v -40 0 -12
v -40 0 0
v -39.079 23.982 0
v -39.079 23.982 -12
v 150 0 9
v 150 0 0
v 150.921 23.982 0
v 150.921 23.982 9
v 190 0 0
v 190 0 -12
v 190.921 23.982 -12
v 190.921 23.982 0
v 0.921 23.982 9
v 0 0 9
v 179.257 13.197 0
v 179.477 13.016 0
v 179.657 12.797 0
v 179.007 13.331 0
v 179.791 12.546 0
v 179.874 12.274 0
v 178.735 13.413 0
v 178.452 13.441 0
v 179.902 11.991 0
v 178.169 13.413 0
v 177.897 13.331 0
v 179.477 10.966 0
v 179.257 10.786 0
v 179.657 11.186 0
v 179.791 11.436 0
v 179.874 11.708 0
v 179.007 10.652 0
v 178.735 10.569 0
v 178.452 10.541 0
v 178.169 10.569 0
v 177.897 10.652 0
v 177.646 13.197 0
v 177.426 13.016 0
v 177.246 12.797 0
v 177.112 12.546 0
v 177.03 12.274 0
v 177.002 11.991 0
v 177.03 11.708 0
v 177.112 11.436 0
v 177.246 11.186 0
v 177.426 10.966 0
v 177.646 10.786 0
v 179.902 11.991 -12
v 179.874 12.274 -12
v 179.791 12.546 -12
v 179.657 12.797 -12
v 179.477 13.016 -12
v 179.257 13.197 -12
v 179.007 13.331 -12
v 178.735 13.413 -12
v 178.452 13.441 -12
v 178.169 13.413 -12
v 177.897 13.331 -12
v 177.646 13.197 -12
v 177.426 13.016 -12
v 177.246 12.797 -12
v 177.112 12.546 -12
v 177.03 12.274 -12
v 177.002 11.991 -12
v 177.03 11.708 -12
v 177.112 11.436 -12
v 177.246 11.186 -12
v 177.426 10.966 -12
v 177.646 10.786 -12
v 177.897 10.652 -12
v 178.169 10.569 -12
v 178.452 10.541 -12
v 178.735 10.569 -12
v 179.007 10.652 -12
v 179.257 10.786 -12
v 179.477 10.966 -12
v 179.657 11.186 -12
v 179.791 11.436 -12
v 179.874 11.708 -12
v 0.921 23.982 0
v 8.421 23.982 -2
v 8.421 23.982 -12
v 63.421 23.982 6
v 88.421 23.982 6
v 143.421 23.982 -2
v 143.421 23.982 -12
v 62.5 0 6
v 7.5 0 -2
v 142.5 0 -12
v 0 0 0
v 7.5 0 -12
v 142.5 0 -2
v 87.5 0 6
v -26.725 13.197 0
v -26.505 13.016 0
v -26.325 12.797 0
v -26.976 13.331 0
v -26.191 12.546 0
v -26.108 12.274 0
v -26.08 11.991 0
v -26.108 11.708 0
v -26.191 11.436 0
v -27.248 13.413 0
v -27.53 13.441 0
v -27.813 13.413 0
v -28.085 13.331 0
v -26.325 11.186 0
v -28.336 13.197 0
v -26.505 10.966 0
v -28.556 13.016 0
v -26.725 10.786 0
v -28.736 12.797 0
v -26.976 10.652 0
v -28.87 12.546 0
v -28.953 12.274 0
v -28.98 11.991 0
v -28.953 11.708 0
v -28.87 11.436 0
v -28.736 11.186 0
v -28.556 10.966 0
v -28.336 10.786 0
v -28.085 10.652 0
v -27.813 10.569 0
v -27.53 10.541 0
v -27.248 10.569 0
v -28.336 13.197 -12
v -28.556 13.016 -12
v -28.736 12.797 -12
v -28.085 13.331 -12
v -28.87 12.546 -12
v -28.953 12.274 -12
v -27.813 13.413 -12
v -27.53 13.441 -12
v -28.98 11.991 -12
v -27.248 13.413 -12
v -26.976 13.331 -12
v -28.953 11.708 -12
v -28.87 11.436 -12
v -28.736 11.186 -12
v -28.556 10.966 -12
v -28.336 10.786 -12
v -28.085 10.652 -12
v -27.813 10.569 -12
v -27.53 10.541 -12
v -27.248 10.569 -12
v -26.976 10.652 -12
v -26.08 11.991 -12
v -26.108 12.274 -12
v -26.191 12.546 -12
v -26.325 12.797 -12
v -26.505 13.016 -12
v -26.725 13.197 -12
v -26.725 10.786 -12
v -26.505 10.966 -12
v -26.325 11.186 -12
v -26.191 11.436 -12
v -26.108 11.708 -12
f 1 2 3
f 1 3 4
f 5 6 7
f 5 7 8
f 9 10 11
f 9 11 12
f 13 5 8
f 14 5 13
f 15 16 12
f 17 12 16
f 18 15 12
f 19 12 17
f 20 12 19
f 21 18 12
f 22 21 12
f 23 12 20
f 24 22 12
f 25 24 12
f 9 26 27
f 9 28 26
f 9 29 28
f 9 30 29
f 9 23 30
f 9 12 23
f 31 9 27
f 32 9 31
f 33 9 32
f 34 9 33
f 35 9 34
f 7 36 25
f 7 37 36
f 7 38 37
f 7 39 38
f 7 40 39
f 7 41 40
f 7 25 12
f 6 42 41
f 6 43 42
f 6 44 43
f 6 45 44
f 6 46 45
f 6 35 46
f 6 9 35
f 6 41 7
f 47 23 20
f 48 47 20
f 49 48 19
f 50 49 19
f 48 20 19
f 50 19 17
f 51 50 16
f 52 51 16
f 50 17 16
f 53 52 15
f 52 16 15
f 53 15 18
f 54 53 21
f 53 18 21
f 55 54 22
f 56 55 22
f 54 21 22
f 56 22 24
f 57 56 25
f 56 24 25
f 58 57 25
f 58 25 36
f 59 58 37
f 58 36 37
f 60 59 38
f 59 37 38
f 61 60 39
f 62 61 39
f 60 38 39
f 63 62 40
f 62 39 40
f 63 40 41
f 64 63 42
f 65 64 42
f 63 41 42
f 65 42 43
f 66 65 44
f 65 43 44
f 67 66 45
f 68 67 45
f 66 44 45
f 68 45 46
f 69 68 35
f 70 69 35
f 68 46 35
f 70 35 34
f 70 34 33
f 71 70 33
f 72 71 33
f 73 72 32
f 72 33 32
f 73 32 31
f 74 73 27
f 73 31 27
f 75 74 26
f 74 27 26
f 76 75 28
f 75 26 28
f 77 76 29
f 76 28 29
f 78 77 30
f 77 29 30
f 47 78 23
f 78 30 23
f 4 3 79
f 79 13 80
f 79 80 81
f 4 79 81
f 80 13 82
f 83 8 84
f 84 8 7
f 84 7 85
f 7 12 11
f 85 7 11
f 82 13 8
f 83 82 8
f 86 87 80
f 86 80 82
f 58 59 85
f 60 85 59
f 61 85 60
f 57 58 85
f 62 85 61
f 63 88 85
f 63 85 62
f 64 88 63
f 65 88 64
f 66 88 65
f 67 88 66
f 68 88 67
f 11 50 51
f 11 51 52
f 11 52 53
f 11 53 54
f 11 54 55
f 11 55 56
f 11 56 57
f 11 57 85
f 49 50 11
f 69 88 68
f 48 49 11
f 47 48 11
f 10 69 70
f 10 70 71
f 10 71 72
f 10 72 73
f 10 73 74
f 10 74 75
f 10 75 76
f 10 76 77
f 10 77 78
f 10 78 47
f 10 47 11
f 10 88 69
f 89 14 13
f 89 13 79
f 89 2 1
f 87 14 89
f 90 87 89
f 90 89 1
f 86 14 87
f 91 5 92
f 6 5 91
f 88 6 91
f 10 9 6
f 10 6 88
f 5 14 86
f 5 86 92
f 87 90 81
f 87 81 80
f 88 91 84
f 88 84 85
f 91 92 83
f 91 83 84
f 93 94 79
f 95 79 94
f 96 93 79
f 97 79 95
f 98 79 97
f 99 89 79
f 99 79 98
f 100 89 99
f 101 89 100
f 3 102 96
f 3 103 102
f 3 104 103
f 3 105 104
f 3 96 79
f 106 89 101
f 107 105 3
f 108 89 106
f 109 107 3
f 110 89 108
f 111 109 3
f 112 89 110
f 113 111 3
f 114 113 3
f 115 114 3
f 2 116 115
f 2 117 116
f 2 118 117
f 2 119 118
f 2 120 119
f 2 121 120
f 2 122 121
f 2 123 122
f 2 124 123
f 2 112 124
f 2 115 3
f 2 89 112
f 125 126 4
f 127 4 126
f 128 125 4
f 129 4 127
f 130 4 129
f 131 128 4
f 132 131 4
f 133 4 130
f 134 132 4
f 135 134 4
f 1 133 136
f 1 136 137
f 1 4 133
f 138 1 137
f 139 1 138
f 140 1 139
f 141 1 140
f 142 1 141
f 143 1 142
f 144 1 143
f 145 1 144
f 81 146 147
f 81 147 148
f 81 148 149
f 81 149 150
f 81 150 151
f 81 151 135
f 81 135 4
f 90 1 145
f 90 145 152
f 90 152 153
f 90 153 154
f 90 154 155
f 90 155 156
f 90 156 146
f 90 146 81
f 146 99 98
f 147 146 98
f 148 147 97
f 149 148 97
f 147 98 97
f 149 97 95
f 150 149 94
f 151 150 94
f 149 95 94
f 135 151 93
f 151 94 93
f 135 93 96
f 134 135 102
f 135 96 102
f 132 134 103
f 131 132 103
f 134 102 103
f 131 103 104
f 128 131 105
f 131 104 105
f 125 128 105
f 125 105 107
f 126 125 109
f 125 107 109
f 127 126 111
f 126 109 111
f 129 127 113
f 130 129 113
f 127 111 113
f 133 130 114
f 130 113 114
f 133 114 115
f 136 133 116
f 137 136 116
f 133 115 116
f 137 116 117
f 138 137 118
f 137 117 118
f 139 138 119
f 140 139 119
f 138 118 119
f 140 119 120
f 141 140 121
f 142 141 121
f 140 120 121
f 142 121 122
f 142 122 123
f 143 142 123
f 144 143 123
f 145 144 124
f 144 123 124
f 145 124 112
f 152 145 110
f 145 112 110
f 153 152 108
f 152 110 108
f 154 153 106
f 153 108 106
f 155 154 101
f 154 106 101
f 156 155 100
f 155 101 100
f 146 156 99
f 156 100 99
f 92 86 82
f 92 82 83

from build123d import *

# Parameters (mm, degrees)
F3_R     = 1.45
F4_DEPTH = 12


with BuildPart() as f2:
    # F2: sweep along a path in F1
    with BuildLine(Plane.XY) as f2_path:
        Line((-39.078693, 23.98231), (-40, 0))
    # F0 (on Front) → F2 (sweep)
    with BuildSketch(Plane.XZ):
        Polygon((0, 0), (-40, 0), (-40, -12), (7.5, -12), (7.5, -2), (62.5, 6), (87.5, 6), (142.5, -2), (142.5, -12), (190, -12), (190, 0), (150, 0), (150, 9), (0, 9), align=None)
    sweep(path=f2_path.line)

    # F3 (on face) → F4 (cut, through all)
    with BuildSketch(Plane.XY):
        with Locations((178.451802, 11.991155)):
            Circle(F3_R)
        with Locations((-27.530495, 11.991155)):
            Circle(F3_R)
    extrude(amount=-F4_DEPTH, mode=Mode.SUBTRACT)


solid = f2.part
